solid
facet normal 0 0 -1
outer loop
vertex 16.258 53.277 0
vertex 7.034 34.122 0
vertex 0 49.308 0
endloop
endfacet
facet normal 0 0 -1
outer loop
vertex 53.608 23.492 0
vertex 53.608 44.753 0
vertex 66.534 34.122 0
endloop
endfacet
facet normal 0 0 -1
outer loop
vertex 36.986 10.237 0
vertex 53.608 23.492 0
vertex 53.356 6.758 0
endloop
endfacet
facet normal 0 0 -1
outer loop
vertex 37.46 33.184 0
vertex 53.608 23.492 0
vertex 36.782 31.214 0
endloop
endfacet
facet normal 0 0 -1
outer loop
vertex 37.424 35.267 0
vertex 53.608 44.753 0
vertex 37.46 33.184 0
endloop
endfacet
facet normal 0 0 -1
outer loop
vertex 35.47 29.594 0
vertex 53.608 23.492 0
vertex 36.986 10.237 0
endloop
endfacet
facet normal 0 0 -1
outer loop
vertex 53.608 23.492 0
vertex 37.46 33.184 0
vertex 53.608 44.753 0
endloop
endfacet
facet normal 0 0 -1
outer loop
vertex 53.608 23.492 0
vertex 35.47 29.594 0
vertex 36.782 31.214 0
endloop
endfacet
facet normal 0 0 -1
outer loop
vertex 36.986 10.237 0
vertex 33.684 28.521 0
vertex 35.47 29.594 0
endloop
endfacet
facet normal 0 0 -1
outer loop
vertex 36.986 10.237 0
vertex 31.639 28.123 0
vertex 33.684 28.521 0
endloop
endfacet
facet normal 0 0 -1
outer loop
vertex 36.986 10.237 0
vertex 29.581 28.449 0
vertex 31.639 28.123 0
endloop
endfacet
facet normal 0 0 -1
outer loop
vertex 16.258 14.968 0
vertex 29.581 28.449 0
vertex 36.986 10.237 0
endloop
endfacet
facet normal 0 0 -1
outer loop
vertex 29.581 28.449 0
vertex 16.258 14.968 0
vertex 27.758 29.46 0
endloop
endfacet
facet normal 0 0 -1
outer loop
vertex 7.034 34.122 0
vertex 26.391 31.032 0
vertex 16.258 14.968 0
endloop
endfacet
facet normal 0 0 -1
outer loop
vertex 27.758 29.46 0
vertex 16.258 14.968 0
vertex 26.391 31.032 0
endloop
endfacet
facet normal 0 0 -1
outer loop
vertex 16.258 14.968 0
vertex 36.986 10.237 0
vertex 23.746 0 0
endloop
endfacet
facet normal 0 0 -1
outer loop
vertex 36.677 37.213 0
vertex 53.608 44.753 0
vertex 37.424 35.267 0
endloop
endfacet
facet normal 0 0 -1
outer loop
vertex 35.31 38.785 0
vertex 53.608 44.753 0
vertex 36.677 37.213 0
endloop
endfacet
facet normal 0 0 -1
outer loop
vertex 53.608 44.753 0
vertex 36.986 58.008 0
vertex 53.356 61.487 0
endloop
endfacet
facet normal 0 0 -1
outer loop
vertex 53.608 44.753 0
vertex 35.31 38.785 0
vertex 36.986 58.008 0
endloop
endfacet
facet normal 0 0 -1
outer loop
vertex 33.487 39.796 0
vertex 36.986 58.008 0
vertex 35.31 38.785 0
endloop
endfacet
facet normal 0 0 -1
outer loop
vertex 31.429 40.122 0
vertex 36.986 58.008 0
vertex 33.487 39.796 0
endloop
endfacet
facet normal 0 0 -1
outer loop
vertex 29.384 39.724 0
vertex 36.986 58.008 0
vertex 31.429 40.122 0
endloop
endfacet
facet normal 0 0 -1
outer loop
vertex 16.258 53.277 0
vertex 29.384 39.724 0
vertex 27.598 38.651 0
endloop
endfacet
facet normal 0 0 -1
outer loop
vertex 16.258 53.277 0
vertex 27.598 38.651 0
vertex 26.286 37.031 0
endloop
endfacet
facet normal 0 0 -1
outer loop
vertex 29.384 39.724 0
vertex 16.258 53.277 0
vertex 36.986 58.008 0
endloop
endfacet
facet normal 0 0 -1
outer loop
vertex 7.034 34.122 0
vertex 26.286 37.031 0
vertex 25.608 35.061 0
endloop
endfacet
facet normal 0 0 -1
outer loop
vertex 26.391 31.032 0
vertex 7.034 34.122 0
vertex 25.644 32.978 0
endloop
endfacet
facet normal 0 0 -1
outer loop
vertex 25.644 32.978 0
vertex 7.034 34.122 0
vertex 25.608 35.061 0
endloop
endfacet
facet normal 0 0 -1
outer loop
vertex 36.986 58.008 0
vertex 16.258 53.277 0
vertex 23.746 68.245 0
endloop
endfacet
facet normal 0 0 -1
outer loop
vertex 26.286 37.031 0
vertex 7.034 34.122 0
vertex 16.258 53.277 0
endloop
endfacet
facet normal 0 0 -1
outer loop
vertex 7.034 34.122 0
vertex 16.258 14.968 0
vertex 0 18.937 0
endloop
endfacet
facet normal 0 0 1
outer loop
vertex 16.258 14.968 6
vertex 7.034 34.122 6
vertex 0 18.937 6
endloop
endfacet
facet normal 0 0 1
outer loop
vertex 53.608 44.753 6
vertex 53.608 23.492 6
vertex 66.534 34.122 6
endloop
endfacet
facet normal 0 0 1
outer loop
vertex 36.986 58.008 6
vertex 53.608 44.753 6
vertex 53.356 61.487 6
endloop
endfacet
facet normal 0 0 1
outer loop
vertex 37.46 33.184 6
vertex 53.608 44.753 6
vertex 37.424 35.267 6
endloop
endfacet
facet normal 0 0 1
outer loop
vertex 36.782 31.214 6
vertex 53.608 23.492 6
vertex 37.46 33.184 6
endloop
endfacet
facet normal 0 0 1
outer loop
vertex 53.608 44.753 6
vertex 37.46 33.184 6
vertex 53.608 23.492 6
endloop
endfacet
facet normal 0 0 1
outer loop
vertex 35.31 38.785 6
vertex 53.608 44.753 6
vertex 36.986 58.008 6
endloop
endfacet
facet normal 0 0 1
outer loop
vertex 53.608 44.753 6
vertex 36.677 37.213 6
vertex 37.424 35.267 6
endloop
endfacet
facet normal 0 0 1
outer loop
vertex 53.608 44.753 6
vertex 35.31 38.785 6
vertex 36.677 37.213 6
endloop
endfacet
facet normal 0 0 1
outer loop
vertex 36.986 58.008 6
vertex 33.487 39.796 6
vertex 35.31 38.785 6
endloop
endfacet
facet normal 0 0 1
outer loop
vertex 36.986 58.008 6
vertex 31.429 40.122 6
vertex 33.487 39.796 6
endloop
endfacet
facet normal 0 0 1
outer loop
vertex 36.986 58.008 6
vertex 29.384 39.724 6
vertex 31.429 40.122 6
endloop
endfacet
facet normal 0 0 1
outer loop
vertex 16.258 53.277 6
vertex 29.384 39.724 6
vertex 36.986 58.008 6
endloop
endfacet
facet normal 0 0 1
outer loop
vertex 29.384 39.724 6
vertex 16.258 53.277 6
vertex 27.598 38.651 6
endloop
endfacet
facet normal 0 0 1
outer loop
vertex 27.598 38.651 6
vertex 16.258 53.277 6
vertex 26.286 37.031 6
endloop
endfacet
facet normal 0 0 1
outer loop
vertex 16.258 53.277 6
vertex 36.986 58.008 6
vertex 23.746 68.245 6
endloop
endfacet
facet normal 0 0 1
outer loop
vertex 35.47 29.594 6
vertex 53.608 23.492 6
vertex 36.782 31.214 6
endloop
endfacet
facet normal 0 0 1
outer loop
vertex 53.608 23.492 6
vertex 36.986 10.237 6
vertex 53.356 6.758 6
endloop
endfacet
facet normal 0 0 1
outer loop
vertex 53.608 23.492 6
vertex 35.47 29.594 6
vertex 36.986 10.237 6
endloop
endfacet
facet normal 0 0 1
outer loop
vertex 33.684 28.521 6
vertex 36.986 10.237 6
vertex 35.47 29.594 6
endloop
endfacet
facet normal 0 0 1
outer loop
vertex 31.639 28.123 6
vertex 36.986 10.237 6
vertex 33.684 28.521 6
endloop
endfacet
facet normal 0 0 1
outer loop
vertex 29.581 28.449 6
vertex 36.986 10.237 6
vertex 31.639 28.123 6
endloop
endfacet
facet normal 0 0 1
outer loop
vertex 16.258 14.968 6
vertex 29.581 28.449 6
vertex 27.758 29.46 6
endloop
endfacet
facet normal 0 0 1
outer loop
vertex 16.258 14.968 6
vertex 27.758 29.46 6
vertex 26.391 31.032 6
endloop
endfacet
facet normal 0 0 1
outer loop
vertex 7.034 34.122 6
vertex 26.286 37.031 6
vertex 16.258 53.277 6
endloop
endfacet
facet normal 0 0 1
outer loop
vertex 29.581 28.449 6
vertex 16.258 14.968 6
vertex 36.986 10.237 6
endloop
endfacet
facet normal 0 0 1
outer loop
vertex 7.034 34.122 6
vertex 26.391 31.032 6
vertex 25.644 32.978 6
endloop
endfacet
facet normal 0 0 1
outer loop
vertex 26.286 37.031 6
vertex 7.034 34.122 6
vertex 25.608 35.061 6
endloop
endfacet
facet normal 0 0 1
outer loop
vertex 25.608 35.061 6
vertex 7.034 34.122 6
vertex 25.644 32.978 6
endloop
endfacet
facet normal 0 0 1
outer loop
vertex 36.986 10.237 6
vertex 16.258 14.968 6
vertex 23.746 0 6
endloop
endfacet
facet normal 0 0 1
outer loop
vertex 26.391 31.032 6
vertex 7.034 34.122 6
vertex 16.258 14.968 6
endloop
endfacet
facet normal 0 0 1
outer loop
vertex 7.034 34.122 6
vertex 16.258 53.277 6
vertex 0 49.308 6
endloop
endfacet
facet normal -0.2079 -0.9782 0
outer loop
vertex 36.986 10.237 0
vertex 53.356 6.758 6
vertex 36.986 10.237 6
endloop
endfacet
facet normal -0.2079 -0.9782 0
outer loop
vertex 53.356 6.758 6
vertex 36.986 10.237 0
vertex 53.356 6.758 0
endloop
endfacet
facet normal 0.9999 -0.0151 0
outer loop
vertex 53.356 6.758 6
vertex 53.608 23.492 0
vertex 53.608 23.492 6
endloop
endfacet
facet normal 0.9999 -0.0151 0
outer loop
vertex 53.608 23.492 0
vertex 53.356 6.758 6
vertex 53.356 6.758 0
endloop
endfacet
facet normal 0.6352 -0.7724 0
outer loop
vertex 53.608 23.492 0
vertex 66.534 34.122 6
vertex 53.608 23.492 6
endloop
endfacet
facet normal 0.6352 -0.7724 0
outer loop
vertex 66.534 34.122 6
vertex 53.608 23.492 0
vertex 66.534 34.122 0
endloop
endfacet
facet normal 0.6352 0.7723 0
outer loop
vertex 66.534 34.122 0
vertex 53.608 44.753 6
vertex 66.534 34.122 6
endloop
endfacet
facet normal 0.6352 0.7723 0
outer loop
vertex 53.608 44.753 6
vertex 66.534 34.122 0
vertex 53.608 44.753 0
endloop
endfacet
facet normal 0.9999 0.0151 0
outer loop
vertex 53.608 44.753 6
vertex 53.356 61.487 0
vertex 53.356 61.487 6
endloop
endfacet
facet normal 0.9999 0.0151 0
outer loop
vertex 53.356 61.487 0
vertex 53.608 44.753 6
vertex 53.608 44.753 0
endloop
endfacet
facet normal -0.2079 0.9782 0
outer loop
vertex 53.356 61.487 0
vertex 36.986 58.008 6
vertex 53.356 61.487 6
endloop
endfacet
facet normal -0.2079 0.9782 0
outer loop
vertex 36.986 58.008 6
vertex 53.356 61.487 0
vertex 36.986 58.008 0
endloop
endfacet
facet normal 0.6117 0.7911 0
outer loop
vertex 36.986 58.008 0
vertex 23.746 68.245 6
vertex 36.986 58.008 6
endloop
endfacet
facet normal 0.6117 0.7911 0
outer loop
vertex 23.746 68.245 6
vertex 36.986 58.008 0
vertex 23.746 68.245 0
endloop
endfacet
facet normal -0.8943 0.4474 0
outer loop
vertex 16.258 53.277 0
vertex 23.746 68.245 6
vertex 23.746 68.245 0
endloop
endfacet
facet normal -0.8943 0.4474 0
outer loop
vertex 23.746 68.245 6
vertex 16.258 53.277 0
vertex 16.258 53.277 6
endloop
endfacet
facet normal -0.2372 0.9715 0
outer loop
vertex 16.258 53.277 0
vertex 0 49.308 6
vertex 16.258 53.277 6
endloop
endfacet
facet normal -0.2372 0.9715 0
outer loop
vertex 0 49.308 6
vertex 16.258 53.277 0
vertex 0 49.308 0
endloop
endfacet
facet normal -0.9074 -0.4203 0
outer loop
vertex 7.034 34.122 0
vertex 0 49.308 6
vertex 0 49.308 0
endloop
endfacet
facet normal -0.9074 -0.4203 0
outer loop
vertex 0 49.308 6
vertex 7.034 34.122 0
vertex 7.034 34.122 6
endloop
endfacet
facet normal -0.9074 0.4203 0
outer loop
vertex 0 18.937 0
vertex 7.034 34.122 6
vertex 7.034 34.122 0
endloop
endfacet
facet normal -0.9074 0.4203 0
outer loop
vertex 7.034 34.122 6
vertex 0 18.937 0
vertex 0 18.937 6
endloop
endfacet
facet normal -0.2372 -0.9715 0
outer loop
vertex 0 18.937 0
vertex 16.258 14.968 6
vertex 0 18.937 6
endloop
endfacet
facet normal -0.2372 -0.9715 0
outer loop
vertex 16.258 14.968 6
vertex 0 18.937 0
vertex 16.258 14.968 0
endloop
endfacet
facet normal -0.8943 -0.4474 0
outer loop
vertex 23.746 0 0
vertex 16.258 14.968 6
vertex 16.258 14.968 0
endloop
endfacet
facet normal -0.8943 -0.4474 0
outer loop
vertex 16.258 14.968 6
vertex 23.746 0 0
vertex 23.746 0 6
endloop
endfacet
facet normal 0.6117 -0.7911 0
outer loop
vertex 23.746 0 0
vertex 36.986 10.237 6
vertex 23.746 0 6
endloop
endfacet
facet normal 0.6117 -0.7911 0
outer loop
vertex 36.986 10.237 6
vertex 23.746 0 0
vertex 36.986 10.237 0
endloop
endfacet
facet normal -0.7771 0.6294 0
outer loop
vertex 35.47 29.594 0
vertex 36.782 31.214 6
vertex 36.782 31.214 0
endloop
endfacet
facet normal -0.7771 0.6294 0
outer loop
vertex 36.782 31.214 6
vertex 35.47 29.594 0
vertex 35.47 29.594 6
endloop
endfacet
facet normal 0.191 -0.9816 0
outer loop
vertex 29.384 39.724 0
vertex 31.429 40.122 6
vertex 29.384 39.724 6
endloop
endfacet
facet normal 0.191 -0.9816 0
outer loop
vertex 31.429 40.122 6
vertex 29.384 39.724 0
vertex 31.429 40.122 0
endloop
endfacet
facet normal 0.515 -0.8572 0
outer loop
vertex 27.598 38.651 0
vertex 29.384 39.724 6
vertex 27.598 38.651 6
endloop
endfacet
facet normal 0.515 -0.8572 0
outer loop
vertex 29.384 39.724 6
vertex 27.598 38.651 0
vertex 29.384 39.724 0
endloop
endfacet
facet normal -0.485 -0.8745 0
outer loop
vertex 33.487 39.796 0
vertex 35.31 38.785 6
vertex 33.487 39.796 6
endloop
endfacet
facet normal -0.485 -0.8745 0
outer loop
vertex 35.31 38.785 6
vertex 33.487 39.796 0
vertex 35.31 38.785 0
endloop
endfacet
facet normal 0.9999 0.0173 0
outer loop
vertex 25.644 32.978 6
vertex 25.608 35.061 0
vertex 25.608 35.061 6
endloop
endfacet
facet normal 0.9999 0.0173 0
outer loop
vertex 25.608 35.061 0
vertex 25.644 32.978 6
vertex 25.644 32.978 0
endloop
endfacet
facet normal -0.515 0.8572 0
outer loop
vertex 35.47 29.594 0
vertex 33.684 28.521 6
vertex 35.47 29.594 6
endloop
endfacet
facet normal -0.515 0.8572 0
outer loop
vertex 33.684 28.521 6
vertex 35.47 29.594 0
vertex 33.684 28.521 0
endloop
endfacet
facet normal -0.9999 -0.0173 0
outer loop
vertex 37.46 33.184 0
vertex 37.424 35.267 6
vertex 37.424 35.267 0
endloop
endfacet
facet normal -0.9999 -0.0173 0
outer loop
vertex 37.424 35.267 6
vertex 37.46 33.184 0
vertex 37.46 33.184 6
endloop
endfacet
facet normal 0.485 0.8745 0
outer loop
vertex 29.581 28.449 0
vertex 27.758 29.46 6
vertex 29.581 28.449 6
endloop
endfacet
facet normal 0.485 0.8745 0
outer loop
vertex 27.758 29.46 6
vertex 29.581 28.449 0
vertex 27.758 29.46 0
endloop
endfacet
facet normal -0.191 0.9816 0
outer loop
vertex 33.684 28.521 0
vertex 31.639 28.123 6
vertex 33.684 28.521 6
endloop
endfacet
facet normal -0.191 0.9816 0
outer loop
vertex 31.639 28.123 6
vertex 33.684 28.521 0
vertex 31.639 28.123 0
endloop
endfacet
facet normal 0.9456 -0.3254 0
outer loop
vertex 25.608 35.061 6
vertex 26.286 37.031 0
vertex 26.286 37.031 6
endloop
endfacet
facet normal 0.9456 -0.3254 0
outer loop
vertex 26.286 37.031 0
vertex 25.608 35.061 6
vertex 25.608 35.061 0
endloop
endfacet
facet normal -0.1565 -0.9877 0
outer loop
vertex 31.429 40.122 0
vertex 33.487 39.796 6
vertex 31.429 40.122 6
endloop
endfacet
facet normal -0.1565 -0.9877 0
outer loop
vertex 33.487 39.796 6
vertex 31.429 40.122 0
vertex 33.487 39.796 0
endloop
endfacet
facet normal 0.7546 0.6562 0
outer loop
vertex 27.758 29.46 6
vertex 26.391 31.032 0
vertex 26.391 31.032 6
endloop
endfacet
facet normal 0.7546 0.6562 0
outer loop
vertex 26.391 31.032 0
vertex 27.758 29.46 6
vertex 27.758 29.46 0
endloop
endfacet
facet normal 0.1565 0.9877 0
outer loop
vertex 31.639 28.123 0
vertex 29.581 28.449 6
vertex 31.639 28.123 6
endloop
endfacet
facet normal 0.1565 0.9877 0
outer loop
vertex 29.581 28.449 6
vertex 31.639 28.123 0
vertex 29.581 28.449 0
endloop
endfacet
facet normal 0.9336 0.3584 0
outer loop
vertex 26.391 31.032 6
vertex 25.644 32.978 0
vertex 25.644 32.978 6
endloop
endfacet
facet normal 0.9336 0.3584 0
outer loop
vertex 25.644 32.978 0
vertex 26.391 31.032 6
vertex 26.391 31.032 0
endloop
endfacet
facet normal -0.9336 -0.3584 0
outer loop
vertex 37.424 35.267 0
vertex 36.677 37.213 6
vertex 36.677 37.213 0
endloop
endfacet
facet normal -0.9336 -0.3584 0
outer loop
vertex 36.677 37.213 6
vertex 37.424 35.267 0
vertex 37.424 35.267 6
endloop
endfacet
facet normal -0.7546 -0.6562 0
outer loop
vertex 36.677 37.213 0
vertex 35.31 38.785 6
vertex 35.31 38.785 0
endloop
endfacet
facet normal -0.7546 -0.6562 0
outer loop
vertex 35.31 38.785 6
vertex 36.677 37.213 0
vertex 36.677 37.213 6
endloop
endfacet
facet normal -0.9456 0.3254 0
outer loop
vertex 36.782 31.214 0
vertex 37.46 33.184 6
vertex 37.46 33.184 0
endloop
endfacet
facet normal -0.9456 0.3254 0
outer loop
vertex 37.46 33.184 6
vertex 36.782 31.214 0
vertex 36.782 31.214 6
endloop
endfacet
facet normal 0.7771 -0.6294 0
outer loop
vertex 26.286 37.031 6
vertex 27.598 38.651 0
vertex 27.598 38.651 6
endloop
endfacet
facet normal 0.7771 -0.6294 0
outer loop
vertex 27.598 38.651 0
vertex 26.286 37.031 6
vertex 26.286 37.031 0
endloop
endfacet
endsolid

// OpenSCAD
$fn = 32;

// ----------------------------------------------------------------------
// Star wheel: 7-point blunt, R35
// ----------------------------------------------------------------------

// --- parameters (mm) ---
n_points = 7;             // number of points / teeth
r_out = 35;               // tip radius
r_in = 24.5;              // root radius
bore_r = 6;               // centre bore radius
plate_t = 6;              // plate thickness, Z (extrusion height)
bore_d = 12;              // centre bore diameter

profile = [[66.534, 34.122], [53.608, 44.753], [53.356, 61.487], [36.986, 58.008], [23.746, 68.245], [16.258, 53.277], [0, 49.308], [7.034, 34.122], [0, 18.937], [16.258, 14.968], [23.746, 0], [36.986, 10.237], [53.356, 6.758], [53.608, 23.492]];  // primary outline, 14 points, counter clockwise
void_1 = [[37.424, 35.267], [36.677, 37.213], [35.31, 38.785], [33.487, 39.796], [31.429, 40.122], [29.384, 39.724], [27.598, 38.651], [26.286, 37.031], [25.608, 35.061], [25.644, 32.978], [26.391, 31.032], [27.758, 29.46], [29.581, 28.449], [31.639, 28.123], [33.684, 28.521], [35.47, 29.594], [36.782, 31.214], [37.46, 33.184]];  // centre bore, 18 points

// --- the one profile operation ---
difference() {
  linear_extrude(height = plate_t) polygon(points = profile);
  translate([0, 0, -1])
    linear_extrude(height = plate_t + 2) polygon(points = void_1);
}
